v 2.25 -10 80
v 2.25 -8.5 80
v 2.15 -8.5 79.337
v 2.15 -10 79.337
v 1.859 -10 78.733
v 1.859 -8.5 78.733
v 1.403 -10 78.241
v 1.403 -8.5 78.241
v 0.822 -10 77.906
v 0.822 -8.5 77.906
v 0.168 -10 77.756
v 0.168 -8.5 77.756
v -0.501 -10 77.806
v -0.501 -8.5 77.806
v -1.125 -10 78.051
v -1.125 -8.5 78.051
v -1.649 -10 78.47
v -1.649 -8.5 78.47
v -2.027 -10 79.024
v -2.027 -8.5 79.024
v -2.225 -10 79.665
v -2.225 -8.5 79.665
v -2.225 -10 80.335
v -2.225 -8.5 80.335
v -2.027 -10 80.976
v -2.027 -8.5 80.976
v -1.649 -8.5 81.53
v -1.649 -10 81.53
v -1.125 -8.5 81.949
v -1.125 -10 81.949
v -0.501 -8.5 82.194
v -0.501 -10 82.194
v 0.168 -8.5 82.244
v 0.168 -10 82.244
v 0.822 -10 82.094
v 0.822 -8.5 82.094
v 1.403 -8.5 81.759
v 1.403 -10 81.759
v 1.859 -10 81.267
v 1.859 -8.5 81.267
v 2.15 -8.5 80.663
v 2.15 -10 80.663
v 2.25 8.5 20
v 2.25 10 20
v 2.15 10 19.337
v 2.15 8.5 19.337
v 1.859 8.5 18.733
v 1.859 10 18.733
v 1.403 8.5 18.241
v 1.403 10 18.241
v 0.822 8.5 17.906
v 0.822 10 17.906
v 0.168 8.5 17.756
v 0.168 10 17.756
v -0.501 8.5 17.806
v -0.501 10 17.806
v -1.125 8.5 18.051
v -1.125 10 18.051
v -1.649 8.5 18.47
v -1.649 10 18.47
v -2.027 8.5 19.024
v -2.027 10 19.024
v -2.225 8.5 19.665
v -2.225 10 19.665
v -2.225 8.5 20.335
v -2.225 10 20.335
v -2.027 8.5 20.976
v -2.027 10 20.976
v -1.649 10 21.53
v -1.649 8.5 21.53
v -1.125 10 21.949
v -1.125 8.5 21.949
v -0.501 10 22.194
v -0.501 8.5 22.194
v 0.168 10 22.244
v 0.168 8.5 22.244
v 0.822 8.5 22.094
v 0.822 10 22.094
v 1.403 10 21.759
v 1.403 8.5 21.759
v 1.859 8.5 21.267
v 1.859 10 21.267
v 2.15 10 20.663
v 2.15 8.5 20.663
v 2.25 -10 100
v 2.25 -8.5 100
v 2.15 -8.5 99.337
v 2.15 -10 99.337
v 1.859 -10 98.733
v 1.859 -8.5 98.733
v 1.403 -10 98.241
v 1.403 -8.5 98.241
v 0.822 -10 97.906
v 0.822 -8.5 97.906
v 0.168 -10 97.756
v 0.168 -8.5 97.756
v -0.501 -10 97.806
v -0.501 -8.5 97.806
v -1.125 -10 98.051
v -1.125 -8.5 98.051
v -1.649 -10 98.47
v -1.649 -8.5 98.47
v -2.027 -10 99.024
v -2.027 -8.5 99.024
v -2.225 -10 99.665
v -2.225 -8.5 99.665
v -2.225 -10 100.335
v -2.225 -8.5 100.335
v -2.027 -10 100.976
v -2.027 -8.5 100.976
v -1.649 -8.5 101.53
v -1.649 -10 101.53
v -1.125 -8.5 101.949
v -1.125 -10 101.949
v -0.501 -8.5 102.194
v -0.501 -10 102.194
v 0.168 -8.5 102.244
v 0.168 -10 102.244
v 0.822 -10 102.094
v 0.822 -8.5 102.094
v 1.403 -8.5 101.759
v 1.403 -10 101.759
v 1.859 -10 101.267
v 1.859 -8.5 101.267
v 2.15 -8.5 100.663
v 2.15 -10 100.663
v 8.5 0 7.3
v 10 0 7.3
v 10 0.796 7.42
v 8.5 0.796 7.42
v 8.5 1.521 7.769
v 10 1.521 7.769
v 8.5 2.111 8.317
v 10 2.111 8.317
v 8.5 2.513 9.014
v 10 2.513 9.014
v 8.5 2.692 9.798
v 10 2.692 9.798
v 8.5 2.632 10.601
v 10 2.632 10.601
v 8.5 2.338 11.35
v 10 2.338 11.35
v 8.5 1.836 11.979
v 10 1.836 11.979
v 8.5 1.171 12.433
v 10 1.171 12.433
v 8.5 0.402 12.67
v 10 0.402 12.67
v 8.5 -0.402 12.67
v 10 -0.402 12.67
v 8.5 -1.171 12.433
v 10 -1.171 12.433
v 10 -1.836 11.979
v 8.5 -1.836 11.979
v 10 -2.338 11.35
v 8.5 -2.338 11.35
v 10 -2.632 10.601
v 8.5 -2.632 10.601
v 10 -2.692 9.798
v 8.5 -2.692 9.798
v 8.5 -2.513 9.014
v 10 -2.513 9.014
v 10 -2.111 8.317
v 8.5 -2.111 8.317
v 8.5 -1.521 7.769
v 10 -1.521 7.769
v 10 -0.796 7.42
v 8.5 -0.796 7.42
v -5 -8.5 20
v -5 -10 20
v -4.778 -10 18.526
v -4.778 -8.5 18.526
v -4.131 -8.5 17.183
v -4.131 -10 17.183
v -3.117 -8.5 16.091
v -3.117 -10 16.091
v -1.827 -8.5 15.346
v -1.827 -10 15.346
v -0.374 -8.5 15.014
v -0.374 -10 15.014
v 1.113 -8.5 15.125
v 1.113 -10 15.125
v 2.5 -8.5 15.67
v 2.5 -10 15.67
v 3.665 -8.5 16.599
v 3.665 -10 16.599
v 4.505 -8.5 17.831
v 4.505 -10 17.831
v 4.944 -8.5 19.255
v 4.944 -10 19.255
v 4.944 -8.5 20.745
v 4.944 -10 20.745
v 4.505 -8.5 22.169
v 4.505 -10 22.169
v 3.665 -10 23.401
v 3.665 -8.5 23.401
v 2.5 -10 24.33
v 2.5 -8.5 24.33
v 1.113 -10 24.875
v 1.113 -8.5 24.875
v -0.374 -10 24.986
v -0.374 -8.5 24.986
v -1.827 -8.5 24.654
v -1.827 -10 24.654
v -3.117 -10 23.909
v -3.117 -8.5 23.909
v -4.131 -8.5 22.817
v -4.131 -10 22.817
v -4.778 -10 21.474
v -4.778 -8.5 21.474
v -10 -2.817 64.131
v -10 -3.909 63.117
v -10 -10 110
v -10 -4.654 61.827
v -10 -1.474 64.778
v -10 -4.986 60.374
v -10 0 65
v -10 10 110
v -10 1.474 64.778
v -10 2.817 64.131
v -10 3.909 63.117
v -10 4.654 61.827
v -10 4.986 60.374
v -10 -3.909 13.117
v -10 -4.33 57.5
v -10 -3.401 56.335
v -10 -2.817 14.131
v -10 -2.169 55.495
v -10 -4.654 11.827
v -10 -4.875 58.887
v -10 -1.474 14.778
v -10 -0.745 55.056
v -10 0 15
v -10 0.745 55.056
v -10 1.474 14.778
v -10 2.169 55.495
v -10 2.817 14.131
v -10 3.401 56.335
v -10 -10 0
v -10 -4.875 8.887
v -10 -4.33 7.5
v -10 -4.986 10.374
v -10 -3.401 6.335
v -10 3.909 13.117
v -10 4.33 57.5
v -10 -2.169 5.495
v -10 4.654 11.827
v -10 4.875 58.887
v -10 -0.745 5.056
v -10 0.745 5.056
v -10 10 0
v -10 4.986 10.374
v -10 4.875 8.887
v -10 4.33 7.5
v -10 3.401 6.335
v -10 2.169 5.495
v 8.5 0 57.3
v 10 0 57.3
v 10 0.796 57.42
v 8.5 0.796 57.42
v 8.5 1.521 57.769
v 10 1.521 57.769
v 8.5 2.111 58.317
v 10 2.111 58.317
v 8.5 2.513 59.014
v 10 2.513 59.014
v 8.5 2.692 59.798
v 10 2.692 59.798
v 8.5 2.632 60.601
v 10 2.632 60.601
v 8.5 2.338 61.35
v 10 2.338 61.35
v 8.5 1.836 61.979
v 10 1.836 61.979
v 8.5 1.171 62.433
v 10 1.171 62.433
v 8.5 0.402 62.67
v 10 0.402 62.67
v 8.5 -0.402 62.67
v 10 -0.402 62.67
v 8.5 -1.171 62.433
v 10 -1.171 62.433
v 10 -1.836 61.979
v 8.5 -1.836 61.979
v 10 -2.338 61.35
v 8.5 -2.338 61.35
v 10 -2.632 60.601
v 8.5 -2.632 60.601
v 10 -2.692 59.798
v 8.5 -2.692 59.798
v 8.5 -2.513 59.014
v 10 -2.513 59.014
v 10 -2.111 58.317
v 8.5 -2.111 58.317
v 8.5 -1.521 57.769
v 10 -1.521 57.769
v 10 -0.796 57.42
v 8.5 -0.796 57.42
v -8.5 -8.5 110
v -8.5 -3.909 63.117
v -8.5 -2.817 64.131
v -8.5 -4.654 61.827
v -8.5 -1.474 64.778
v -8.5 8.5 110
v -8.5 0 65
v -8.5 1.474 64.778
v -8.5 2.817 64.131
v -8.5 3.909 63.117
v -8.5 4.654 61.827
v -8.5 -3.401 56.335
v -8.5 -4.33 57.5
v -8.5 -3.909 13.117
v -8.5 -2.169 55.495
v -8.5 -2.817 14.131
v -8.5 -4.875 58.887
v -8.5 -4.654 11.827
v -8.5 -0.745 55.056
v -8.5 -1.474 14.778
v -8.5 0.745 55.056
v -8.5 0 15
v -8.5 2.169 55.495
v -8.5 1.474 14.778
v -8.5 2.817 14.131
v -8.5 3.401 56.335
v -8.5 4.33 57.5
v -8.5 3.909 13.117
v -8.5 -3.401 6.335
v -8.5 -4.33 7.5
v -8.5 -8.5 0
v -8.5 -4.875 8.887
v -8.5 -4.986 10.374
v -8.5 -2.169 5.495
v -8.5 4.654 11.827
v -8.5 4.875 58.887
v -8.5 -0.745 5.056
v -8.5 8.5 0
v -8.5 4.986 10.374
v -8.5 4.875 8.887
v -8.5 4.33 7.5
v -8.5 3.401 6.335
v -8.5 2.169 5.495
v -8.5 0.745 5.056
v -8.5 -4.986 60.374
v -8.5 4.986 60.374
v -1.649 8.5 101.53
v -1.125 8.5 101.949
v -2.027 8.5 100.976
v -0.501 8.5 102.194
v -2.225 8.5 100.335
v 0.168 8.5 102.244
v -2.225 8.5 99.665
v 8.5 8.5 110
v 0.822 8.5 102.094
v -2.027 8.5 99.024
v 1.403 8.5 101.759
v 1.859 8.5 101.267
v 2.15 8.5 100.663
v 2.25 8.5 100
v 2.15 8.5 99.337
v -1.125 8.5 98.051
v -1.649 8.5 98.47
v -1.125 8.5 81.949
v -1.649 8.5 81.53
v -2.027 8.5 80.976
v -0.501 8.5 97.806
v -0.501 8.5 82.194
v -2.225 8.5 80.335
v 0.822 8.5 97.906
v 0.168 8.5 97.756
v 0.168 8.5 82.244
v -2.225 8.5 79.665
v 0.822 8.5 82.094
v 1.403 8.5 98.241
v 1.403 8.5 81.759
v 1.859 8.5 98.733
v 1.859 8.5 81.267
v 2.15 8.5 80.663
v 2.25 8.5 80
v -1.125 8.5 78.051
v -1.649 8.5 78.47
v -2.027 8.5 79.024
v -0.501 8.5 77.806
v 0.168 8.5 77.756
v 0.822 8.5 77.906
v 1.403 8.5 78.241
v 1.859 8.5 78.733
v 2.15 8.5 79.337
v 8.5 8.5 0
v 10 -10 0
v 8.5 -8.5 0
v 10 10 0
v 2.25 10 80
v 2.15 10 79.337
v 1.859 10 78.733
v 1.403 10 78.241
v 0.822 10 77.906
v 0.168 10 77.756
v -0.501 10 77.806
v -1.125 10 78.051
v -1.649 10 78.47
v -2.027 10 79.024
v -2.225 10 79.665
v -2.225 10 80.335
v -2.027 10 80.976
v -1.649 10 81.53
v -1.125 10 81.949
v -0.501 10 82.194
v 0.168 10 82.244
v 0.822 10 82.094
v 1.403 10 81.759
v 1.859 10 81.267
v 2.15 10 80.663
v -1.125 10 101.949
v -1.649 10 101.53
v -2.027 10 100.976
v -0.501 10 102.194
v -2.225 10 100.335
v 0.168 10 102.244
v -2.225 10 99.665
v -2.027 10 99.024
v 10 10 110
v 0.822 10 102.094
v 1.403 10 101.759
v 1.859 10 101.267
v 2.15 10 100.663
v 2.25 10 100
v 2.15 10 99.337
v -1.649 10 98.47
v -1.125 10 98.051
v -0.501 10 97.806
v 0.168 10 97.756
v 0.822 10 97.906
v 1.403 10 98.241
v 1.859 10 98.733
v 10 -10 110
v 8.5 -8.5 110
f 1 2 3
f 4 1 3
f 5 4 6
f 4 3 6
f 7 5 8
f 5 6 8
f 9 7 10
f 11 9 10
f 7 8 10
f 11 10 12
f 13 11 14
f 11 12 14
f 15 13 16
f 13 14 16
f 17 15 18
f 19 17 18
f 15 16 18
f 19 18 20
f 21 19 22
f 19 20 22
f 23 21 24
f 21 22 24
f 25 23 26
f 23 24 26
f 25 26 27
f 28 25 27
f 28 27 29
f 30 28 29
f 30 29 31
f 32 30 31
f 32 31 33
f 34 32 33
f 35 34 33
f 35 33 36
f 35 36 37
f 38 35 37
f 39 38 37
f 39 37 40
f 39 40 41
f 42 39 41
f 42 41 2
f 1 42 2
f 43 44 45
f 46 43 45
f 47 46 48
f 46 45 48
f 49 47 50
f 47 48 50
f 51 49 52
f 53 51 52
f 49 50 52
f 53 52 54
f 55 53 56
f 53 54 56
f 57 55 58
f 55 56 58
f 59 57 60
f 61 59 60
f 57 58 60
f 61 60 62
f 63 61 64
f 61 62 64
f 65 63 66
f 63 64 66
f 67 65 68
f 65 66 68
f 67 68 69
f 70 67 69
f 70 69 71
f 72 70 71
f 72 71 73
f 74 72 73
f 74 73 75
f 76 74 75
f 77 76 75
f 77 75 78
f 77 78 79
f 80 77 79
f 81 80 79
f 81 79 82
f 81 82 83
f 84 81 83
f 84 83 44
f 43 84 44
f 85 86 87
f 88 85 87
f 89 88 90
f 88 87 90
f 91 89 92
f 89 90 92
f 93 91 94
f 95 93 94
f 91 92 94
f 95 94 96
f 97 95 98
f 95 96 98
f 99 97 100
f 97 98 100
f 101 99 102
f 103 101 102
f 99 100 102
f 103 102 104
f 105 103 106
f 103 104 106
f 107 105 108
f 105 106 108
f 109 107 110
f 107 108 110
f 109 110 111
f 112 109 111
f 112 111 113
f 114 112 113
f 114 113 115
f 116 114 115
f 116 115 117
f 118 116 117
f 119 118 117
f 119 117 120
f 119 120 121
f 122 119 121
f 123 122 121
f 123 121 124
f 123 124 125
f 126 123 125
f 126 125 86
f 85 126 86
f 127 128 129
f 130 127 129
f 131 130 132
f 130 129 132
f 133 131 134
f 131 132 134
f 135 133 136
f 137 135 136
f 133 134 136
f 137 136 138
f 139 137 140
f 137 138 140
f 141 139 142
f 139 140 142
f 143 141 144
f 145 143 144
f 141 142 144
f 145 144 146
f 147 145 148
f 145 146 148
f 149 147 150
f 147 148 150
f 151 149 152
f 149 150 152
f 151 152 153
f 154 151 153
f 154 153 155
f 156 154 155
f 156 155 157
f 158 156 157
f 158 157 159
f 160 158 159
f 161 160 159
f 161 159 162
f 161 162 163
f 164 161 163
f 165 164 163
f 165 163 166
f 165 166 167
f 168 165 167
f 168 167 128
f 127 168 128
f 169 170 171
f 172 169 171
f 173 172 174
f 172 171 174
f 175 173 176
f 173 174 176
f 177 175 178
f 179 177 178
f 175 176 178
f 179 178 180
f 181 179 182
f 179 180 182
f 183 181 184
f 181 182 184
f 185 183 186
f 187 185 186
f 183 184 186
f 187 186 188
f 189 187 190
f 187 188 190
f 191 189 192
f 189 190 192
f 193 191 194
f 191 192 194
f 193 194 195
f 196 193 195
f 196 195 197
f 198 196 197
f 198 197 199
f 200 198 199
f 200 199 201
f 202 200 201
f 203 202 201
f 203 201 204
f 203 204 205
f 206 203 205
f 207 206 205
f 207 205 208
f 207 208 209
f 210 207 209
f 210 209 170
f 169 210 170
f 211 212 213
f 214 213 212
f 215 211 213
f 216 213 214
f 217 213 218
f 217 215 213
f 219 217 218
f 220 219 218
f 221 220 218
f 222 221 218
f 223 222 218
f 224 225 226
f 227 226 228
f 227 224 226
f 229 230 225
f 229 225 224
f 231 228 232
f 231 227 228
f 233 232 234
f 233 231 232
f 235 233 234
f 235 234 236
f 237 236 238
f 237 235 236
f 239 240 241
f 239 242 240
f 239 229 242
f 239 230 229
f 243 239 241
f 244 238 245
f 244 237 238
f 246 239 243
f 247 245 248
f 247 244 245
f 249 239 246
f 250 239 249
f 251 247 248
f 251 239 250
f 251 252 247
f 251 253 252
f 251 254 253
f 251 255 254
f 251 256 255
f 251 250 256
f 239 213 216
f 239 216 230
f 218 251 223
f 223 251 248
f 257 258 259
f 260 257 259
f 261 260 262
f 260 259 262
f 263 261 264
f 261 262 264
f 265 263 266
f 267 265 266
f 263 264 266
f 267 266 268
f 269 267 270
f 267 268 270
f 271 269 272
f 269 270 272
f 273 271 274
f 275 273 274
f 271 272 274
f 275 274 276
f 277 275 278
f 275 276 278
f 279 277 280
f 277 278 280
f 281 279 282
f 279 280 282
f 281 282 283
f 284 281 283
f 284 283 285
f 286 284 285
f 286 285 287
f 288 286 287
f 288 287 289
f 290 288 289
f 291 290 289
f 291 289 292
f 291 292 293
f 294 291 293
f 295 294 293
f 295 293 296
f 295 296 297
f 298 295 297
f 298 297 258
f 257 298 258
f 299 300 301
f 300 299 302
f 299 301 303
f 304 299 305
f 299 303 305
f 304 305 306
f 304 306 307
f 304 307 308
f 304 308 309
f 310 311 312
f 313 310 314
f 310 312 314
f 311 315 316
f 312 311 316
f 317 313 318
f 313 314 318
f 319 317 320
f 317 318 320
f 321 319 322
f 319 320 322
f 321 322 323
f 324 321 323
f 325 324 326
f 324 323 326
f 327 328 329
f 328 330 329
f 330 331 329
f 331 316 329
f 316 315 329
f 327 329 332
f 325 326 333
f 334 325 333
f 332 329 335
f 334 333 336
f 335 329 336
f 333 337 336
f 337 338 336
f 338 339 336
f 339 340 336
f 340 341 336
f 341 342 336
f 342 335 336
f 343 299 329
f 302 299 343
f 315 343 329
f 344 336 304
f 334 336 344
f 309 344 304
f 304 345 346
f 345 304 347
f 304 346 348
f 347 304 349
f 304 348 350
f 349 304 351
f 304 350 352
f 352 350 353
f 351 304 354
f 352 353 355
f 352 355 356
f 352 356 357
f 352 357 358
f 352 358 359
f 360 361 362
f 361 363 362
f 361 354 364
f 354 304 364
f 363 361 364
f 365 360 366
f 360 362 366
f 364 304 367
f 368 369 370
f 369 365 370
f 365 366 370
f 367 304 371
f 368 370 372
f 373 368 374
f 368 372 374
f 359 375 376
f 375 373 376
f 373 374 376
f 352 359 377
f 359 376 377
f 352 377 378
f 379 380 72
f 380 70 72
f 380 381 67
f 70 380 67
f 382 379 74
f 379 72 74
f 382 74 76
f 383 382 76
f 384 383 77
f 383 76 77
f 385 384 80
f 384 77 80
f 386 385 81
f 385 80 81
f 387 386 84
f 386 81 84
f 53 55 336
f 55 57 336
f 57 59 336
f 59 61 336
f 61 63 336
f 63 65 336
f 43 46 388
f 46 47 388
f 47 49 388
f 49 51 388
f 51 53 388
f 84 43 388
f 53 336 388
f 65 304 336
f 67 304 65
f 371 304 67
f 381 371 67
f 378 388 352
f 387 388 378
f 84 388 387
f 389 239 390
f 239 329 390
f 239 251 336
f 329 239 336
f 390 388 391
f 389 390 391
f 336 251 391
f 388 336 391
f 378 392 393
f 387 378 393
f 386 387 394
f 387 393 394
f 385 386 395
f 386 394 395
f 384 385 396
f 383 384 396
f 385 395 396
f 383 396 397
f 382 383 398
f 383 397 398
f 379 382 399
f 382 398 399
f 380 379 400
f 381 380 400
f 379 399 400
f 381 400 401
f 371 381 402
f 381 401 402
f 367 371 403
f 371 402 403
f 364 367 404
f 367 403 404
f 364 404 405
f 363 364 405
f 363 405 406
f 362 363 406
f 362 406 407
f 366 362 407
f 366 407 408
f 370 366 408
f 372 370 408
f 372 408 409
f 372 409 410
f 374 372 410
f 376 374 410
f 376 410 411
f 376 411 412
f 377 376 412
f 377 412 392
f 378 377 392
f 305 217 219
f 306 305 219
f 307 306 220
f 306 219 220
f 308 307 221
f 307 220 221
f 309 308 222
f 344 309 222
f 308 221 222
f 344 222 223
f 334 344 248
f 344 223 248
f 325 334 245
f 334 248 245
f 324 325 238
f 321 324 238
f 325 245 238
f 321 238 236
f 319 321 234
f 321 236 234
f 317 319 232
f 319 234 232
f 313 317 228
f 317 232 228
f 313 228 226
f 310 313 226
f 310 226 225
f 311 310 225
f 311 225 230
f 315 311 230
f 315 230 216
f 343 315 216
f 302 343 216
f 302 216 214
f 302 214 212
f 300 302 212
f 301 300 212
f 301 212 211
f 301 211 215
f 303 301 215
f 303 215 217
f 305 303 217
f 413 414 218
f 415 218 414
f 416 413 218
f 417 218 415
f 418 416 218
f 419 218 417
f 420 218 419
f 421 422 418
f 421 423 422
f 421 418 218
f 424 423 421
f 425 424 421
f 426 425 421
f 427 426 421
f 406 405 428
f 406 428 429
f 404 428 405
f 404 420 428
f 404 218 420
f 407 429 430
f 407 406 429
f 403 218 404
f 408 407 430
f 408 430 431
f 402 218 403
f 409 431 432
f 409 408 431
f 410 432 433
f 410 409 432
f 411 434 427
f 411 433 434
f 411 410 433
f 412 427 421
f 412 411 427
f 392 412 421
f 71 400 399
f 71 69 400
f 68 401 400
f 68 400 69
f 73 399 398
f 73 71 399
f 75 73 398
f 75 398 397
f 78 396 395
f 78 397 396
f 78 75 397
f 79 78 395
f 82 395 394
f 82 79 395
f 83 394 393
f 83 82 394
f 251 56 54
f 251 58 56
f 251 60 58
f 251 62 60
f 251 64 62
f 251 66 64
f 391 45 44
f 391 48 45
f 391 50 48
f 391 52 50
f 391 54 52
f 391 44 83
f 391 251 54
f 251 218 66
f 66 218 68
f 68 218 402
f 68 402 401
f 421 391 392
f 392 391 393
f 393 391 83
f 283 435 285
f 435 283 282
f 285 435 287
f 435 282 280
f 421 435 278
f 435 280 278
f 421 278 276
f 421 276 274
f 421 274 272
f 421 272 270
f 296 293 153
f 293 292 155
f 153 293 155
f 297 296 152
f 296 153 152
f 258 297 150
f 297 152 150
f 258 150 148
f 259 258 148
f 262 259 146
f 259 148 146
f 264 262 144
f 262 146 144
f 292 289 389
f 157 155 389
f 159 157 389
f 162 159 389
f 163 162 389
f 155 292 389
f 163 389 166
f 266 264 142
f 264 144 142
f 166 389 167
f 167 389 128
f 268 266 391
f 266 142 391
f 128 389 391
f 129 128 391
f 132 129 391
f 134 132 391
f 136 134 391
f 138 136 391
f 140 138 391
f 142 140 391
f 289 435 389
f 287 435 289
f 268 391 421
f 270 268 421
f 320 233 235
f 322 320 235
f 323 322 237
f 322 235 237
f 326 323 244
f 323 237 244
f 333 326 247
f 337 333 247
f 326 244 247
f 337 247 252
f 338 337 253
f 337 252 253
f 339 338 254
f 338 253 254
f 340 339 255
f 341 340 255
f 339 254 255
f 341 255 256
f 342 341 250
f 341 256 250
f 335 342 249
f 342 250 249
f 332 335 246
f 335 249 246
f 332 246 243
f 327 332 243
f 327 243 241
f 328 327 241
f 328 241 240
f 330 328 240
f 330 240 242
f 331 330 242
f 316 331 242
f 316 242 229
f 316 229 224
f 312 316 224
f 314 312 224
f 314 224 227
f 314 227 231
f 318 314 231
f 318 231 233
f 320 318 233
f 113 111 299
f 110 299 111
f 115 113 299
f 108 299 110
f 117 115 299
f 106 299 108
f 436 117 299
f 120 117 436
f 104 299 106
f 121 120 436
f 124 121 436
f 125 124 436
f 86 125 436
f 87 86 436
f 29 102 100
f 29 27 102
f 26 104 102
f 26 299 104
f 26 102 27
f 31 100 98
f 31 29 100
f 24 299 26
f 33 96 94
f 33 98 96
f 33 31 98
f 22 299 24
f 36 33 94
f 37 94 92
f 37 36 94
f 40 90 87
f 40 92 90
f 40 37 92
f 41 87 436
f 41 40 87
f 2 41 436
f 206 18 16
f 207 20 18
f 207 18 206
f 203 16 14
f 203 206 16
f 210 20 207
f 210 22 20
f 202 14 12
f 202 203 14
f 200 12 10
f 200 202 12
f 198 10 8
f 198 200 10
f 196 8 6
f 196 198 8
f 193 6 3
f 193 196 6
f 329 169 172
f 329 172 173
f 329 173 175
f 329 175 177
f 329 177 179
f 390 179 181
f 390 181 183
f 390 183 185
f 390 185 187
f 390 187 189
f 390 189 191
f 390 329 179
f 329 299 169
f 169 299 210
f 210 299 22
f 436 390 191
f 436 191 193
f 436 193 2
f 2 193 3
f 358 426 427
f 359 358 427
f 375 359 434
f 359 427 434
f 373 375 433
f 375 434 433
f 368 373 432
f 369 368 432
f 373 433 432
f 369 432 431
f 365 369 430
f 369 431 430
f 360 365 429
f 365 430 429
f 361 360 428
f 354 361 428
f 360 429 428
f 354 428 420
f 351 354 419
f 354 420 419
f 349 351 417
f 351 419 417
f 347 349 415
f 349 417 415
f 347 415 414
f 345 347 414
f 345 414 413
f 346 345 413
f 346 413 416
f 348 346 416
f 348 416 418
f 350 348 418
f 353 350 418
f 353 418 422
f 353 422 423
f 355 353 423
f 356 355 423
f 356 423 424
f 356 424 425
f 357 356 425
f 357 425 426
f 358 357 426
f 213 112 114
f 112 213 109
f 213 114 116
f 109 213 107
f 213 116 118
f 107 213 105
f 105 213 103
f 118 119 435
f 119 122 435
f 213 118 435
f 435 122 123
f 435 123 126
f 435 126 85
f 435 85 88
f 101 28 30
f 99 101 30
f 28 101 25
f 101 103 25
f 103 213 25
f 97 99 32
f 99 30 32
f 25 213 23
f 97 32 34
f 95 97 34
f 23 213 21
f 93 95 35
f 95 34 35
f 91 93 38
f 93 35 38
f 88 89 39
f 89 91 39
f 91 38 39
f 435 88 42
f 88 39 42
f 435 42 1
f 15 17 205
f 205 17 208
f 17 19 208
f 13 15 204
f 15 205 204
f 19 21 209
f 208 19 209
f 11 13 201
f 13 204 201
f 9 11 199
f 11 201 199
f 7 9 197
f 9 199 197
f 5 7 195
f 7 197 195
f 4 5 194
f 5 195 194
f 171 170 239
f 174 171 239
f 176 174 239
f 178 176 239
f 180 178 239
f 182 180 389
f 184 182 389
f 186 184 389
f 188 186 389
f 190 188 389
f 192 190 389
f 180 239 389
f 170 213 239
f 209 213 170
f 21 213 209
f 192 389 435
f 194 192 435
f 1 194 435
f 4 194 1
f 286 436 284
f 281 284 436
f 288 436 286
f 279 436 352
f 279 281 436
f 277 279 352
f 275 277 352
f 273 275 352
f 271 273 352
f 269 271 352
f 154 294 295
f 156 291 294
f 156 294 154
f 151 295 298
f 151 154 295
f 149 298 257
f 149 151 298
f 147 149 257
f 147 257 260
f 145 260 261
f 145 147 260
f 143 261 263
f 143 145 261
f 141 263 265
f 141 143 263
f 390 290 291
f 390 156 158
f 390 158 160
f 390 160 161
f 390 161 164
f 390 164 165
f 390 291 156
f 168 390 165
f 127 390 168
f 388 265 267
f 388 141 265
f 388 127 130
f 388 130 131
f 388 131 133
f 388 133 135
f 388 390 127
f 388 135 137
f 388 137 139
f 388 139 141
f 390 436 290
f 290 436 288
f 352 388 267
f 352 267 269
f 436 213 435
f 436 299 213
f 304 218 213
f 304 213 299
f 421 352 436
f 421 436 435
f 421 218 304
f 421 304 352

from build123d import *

# Parameters (mm, degrees)
SKETCH_1_W          = 20
SKETCH_1_H          = 20
SKETCH_1_W_2        = 17
SKETCH_1_H_2        = 17
EXTRUDE_1_DEPTH     = 110
SKETCH_2_R          = 2.7
CUT_EXTRUDE_1_DEPTH = 25
SKETCH_3_R          = 2.25
CUT_EXTRUDE_2_DEPTH = 20
SKETCH_5_R          = 5
CUT_EXTRUDE_4_DEPTH = 10
SKETCH_6_R          = 5
CUT_EXTRUDE_5_DEPTH = 10


with BuildPart() as part:
    # ｽｹｯﾁ1 → ﾎﾞｽ - 押し出し1 (new body)
    with BuildSketch(Plane.XY):
        Rectangle(SKETCH_1_W, SKETCH_1_H)
        Rectangle(SKETCH_1_W_2, SKETCH_1_H_2, mode=Mode.SUBTRACT)
    extrude(amount=EXTRUDE_1_DEPTH)

    # ｽｹｯﾁ2 → ｶｯﾄ - 押し出し1 (cut)
    with BuildSketch(Plane(origin=(10, 0, 0), x_dir=(0, 0, -1), z_dir=(1, 0, 0))):
        with Locations((-60, 0)):
            Circle(SKETCH_2_R)
        with Locations((-10, 0)):
            Circle(SKETCH_2_R)
    extrude(amount=-CUT_EXTRUDE_1_DEPTH, mode=Mode.SUBTRACT)

    # ｽｹｯﾁ3 → ｶｯﾄ - 押し出し2 (cut)
    with BuildSketch(Plane(origin=(0, 10, 0), x_dir=(1, 0, 0), z_dir=(0, 1, 0))):
        with Locations((0, -100)):
            Circle(SKETCH_3_R)
        with Locations((0, -80)):
            Circle(SKETCH_3_R)
        with Locations((0, -20)):
            Circle(SKETCH_3_R)
    extrude(amount=-CUT_EXTRUDE_2_DEPTH, mode=Mode.SUBTRACT)

    # ｽｹｯﾁ5 → ｶｯﾄ - 押し出し4 (cut)
    with BuildSketch(Plane(origin=(0, -10, 0), x_dir=(-1, 0, 0), z_dir=(0, -1, 0))):
        with Locations((0, -20)):
            Circle(SKETCH_5_R)
    extrude(amount=-CUT_EXTRUDE_4_DEPTH, mode=Mode.SUBTRACT)

    # ｽｹｯﾁ6 → ｶｯﾄ - 押し出し5 (cut)
    with BuildSketch(Plane.ZY.offset(10)):
        with Locations((10, 0)):
            Circle(SKETCH_6_R)
        with Locations((60, 0)):
            Circle(SKETCH_6_R)
    extrude(amount=-CUT_EXTRUDE_5_DEPTH, mode=Mode.SUBTRACT)


solid = part.part
